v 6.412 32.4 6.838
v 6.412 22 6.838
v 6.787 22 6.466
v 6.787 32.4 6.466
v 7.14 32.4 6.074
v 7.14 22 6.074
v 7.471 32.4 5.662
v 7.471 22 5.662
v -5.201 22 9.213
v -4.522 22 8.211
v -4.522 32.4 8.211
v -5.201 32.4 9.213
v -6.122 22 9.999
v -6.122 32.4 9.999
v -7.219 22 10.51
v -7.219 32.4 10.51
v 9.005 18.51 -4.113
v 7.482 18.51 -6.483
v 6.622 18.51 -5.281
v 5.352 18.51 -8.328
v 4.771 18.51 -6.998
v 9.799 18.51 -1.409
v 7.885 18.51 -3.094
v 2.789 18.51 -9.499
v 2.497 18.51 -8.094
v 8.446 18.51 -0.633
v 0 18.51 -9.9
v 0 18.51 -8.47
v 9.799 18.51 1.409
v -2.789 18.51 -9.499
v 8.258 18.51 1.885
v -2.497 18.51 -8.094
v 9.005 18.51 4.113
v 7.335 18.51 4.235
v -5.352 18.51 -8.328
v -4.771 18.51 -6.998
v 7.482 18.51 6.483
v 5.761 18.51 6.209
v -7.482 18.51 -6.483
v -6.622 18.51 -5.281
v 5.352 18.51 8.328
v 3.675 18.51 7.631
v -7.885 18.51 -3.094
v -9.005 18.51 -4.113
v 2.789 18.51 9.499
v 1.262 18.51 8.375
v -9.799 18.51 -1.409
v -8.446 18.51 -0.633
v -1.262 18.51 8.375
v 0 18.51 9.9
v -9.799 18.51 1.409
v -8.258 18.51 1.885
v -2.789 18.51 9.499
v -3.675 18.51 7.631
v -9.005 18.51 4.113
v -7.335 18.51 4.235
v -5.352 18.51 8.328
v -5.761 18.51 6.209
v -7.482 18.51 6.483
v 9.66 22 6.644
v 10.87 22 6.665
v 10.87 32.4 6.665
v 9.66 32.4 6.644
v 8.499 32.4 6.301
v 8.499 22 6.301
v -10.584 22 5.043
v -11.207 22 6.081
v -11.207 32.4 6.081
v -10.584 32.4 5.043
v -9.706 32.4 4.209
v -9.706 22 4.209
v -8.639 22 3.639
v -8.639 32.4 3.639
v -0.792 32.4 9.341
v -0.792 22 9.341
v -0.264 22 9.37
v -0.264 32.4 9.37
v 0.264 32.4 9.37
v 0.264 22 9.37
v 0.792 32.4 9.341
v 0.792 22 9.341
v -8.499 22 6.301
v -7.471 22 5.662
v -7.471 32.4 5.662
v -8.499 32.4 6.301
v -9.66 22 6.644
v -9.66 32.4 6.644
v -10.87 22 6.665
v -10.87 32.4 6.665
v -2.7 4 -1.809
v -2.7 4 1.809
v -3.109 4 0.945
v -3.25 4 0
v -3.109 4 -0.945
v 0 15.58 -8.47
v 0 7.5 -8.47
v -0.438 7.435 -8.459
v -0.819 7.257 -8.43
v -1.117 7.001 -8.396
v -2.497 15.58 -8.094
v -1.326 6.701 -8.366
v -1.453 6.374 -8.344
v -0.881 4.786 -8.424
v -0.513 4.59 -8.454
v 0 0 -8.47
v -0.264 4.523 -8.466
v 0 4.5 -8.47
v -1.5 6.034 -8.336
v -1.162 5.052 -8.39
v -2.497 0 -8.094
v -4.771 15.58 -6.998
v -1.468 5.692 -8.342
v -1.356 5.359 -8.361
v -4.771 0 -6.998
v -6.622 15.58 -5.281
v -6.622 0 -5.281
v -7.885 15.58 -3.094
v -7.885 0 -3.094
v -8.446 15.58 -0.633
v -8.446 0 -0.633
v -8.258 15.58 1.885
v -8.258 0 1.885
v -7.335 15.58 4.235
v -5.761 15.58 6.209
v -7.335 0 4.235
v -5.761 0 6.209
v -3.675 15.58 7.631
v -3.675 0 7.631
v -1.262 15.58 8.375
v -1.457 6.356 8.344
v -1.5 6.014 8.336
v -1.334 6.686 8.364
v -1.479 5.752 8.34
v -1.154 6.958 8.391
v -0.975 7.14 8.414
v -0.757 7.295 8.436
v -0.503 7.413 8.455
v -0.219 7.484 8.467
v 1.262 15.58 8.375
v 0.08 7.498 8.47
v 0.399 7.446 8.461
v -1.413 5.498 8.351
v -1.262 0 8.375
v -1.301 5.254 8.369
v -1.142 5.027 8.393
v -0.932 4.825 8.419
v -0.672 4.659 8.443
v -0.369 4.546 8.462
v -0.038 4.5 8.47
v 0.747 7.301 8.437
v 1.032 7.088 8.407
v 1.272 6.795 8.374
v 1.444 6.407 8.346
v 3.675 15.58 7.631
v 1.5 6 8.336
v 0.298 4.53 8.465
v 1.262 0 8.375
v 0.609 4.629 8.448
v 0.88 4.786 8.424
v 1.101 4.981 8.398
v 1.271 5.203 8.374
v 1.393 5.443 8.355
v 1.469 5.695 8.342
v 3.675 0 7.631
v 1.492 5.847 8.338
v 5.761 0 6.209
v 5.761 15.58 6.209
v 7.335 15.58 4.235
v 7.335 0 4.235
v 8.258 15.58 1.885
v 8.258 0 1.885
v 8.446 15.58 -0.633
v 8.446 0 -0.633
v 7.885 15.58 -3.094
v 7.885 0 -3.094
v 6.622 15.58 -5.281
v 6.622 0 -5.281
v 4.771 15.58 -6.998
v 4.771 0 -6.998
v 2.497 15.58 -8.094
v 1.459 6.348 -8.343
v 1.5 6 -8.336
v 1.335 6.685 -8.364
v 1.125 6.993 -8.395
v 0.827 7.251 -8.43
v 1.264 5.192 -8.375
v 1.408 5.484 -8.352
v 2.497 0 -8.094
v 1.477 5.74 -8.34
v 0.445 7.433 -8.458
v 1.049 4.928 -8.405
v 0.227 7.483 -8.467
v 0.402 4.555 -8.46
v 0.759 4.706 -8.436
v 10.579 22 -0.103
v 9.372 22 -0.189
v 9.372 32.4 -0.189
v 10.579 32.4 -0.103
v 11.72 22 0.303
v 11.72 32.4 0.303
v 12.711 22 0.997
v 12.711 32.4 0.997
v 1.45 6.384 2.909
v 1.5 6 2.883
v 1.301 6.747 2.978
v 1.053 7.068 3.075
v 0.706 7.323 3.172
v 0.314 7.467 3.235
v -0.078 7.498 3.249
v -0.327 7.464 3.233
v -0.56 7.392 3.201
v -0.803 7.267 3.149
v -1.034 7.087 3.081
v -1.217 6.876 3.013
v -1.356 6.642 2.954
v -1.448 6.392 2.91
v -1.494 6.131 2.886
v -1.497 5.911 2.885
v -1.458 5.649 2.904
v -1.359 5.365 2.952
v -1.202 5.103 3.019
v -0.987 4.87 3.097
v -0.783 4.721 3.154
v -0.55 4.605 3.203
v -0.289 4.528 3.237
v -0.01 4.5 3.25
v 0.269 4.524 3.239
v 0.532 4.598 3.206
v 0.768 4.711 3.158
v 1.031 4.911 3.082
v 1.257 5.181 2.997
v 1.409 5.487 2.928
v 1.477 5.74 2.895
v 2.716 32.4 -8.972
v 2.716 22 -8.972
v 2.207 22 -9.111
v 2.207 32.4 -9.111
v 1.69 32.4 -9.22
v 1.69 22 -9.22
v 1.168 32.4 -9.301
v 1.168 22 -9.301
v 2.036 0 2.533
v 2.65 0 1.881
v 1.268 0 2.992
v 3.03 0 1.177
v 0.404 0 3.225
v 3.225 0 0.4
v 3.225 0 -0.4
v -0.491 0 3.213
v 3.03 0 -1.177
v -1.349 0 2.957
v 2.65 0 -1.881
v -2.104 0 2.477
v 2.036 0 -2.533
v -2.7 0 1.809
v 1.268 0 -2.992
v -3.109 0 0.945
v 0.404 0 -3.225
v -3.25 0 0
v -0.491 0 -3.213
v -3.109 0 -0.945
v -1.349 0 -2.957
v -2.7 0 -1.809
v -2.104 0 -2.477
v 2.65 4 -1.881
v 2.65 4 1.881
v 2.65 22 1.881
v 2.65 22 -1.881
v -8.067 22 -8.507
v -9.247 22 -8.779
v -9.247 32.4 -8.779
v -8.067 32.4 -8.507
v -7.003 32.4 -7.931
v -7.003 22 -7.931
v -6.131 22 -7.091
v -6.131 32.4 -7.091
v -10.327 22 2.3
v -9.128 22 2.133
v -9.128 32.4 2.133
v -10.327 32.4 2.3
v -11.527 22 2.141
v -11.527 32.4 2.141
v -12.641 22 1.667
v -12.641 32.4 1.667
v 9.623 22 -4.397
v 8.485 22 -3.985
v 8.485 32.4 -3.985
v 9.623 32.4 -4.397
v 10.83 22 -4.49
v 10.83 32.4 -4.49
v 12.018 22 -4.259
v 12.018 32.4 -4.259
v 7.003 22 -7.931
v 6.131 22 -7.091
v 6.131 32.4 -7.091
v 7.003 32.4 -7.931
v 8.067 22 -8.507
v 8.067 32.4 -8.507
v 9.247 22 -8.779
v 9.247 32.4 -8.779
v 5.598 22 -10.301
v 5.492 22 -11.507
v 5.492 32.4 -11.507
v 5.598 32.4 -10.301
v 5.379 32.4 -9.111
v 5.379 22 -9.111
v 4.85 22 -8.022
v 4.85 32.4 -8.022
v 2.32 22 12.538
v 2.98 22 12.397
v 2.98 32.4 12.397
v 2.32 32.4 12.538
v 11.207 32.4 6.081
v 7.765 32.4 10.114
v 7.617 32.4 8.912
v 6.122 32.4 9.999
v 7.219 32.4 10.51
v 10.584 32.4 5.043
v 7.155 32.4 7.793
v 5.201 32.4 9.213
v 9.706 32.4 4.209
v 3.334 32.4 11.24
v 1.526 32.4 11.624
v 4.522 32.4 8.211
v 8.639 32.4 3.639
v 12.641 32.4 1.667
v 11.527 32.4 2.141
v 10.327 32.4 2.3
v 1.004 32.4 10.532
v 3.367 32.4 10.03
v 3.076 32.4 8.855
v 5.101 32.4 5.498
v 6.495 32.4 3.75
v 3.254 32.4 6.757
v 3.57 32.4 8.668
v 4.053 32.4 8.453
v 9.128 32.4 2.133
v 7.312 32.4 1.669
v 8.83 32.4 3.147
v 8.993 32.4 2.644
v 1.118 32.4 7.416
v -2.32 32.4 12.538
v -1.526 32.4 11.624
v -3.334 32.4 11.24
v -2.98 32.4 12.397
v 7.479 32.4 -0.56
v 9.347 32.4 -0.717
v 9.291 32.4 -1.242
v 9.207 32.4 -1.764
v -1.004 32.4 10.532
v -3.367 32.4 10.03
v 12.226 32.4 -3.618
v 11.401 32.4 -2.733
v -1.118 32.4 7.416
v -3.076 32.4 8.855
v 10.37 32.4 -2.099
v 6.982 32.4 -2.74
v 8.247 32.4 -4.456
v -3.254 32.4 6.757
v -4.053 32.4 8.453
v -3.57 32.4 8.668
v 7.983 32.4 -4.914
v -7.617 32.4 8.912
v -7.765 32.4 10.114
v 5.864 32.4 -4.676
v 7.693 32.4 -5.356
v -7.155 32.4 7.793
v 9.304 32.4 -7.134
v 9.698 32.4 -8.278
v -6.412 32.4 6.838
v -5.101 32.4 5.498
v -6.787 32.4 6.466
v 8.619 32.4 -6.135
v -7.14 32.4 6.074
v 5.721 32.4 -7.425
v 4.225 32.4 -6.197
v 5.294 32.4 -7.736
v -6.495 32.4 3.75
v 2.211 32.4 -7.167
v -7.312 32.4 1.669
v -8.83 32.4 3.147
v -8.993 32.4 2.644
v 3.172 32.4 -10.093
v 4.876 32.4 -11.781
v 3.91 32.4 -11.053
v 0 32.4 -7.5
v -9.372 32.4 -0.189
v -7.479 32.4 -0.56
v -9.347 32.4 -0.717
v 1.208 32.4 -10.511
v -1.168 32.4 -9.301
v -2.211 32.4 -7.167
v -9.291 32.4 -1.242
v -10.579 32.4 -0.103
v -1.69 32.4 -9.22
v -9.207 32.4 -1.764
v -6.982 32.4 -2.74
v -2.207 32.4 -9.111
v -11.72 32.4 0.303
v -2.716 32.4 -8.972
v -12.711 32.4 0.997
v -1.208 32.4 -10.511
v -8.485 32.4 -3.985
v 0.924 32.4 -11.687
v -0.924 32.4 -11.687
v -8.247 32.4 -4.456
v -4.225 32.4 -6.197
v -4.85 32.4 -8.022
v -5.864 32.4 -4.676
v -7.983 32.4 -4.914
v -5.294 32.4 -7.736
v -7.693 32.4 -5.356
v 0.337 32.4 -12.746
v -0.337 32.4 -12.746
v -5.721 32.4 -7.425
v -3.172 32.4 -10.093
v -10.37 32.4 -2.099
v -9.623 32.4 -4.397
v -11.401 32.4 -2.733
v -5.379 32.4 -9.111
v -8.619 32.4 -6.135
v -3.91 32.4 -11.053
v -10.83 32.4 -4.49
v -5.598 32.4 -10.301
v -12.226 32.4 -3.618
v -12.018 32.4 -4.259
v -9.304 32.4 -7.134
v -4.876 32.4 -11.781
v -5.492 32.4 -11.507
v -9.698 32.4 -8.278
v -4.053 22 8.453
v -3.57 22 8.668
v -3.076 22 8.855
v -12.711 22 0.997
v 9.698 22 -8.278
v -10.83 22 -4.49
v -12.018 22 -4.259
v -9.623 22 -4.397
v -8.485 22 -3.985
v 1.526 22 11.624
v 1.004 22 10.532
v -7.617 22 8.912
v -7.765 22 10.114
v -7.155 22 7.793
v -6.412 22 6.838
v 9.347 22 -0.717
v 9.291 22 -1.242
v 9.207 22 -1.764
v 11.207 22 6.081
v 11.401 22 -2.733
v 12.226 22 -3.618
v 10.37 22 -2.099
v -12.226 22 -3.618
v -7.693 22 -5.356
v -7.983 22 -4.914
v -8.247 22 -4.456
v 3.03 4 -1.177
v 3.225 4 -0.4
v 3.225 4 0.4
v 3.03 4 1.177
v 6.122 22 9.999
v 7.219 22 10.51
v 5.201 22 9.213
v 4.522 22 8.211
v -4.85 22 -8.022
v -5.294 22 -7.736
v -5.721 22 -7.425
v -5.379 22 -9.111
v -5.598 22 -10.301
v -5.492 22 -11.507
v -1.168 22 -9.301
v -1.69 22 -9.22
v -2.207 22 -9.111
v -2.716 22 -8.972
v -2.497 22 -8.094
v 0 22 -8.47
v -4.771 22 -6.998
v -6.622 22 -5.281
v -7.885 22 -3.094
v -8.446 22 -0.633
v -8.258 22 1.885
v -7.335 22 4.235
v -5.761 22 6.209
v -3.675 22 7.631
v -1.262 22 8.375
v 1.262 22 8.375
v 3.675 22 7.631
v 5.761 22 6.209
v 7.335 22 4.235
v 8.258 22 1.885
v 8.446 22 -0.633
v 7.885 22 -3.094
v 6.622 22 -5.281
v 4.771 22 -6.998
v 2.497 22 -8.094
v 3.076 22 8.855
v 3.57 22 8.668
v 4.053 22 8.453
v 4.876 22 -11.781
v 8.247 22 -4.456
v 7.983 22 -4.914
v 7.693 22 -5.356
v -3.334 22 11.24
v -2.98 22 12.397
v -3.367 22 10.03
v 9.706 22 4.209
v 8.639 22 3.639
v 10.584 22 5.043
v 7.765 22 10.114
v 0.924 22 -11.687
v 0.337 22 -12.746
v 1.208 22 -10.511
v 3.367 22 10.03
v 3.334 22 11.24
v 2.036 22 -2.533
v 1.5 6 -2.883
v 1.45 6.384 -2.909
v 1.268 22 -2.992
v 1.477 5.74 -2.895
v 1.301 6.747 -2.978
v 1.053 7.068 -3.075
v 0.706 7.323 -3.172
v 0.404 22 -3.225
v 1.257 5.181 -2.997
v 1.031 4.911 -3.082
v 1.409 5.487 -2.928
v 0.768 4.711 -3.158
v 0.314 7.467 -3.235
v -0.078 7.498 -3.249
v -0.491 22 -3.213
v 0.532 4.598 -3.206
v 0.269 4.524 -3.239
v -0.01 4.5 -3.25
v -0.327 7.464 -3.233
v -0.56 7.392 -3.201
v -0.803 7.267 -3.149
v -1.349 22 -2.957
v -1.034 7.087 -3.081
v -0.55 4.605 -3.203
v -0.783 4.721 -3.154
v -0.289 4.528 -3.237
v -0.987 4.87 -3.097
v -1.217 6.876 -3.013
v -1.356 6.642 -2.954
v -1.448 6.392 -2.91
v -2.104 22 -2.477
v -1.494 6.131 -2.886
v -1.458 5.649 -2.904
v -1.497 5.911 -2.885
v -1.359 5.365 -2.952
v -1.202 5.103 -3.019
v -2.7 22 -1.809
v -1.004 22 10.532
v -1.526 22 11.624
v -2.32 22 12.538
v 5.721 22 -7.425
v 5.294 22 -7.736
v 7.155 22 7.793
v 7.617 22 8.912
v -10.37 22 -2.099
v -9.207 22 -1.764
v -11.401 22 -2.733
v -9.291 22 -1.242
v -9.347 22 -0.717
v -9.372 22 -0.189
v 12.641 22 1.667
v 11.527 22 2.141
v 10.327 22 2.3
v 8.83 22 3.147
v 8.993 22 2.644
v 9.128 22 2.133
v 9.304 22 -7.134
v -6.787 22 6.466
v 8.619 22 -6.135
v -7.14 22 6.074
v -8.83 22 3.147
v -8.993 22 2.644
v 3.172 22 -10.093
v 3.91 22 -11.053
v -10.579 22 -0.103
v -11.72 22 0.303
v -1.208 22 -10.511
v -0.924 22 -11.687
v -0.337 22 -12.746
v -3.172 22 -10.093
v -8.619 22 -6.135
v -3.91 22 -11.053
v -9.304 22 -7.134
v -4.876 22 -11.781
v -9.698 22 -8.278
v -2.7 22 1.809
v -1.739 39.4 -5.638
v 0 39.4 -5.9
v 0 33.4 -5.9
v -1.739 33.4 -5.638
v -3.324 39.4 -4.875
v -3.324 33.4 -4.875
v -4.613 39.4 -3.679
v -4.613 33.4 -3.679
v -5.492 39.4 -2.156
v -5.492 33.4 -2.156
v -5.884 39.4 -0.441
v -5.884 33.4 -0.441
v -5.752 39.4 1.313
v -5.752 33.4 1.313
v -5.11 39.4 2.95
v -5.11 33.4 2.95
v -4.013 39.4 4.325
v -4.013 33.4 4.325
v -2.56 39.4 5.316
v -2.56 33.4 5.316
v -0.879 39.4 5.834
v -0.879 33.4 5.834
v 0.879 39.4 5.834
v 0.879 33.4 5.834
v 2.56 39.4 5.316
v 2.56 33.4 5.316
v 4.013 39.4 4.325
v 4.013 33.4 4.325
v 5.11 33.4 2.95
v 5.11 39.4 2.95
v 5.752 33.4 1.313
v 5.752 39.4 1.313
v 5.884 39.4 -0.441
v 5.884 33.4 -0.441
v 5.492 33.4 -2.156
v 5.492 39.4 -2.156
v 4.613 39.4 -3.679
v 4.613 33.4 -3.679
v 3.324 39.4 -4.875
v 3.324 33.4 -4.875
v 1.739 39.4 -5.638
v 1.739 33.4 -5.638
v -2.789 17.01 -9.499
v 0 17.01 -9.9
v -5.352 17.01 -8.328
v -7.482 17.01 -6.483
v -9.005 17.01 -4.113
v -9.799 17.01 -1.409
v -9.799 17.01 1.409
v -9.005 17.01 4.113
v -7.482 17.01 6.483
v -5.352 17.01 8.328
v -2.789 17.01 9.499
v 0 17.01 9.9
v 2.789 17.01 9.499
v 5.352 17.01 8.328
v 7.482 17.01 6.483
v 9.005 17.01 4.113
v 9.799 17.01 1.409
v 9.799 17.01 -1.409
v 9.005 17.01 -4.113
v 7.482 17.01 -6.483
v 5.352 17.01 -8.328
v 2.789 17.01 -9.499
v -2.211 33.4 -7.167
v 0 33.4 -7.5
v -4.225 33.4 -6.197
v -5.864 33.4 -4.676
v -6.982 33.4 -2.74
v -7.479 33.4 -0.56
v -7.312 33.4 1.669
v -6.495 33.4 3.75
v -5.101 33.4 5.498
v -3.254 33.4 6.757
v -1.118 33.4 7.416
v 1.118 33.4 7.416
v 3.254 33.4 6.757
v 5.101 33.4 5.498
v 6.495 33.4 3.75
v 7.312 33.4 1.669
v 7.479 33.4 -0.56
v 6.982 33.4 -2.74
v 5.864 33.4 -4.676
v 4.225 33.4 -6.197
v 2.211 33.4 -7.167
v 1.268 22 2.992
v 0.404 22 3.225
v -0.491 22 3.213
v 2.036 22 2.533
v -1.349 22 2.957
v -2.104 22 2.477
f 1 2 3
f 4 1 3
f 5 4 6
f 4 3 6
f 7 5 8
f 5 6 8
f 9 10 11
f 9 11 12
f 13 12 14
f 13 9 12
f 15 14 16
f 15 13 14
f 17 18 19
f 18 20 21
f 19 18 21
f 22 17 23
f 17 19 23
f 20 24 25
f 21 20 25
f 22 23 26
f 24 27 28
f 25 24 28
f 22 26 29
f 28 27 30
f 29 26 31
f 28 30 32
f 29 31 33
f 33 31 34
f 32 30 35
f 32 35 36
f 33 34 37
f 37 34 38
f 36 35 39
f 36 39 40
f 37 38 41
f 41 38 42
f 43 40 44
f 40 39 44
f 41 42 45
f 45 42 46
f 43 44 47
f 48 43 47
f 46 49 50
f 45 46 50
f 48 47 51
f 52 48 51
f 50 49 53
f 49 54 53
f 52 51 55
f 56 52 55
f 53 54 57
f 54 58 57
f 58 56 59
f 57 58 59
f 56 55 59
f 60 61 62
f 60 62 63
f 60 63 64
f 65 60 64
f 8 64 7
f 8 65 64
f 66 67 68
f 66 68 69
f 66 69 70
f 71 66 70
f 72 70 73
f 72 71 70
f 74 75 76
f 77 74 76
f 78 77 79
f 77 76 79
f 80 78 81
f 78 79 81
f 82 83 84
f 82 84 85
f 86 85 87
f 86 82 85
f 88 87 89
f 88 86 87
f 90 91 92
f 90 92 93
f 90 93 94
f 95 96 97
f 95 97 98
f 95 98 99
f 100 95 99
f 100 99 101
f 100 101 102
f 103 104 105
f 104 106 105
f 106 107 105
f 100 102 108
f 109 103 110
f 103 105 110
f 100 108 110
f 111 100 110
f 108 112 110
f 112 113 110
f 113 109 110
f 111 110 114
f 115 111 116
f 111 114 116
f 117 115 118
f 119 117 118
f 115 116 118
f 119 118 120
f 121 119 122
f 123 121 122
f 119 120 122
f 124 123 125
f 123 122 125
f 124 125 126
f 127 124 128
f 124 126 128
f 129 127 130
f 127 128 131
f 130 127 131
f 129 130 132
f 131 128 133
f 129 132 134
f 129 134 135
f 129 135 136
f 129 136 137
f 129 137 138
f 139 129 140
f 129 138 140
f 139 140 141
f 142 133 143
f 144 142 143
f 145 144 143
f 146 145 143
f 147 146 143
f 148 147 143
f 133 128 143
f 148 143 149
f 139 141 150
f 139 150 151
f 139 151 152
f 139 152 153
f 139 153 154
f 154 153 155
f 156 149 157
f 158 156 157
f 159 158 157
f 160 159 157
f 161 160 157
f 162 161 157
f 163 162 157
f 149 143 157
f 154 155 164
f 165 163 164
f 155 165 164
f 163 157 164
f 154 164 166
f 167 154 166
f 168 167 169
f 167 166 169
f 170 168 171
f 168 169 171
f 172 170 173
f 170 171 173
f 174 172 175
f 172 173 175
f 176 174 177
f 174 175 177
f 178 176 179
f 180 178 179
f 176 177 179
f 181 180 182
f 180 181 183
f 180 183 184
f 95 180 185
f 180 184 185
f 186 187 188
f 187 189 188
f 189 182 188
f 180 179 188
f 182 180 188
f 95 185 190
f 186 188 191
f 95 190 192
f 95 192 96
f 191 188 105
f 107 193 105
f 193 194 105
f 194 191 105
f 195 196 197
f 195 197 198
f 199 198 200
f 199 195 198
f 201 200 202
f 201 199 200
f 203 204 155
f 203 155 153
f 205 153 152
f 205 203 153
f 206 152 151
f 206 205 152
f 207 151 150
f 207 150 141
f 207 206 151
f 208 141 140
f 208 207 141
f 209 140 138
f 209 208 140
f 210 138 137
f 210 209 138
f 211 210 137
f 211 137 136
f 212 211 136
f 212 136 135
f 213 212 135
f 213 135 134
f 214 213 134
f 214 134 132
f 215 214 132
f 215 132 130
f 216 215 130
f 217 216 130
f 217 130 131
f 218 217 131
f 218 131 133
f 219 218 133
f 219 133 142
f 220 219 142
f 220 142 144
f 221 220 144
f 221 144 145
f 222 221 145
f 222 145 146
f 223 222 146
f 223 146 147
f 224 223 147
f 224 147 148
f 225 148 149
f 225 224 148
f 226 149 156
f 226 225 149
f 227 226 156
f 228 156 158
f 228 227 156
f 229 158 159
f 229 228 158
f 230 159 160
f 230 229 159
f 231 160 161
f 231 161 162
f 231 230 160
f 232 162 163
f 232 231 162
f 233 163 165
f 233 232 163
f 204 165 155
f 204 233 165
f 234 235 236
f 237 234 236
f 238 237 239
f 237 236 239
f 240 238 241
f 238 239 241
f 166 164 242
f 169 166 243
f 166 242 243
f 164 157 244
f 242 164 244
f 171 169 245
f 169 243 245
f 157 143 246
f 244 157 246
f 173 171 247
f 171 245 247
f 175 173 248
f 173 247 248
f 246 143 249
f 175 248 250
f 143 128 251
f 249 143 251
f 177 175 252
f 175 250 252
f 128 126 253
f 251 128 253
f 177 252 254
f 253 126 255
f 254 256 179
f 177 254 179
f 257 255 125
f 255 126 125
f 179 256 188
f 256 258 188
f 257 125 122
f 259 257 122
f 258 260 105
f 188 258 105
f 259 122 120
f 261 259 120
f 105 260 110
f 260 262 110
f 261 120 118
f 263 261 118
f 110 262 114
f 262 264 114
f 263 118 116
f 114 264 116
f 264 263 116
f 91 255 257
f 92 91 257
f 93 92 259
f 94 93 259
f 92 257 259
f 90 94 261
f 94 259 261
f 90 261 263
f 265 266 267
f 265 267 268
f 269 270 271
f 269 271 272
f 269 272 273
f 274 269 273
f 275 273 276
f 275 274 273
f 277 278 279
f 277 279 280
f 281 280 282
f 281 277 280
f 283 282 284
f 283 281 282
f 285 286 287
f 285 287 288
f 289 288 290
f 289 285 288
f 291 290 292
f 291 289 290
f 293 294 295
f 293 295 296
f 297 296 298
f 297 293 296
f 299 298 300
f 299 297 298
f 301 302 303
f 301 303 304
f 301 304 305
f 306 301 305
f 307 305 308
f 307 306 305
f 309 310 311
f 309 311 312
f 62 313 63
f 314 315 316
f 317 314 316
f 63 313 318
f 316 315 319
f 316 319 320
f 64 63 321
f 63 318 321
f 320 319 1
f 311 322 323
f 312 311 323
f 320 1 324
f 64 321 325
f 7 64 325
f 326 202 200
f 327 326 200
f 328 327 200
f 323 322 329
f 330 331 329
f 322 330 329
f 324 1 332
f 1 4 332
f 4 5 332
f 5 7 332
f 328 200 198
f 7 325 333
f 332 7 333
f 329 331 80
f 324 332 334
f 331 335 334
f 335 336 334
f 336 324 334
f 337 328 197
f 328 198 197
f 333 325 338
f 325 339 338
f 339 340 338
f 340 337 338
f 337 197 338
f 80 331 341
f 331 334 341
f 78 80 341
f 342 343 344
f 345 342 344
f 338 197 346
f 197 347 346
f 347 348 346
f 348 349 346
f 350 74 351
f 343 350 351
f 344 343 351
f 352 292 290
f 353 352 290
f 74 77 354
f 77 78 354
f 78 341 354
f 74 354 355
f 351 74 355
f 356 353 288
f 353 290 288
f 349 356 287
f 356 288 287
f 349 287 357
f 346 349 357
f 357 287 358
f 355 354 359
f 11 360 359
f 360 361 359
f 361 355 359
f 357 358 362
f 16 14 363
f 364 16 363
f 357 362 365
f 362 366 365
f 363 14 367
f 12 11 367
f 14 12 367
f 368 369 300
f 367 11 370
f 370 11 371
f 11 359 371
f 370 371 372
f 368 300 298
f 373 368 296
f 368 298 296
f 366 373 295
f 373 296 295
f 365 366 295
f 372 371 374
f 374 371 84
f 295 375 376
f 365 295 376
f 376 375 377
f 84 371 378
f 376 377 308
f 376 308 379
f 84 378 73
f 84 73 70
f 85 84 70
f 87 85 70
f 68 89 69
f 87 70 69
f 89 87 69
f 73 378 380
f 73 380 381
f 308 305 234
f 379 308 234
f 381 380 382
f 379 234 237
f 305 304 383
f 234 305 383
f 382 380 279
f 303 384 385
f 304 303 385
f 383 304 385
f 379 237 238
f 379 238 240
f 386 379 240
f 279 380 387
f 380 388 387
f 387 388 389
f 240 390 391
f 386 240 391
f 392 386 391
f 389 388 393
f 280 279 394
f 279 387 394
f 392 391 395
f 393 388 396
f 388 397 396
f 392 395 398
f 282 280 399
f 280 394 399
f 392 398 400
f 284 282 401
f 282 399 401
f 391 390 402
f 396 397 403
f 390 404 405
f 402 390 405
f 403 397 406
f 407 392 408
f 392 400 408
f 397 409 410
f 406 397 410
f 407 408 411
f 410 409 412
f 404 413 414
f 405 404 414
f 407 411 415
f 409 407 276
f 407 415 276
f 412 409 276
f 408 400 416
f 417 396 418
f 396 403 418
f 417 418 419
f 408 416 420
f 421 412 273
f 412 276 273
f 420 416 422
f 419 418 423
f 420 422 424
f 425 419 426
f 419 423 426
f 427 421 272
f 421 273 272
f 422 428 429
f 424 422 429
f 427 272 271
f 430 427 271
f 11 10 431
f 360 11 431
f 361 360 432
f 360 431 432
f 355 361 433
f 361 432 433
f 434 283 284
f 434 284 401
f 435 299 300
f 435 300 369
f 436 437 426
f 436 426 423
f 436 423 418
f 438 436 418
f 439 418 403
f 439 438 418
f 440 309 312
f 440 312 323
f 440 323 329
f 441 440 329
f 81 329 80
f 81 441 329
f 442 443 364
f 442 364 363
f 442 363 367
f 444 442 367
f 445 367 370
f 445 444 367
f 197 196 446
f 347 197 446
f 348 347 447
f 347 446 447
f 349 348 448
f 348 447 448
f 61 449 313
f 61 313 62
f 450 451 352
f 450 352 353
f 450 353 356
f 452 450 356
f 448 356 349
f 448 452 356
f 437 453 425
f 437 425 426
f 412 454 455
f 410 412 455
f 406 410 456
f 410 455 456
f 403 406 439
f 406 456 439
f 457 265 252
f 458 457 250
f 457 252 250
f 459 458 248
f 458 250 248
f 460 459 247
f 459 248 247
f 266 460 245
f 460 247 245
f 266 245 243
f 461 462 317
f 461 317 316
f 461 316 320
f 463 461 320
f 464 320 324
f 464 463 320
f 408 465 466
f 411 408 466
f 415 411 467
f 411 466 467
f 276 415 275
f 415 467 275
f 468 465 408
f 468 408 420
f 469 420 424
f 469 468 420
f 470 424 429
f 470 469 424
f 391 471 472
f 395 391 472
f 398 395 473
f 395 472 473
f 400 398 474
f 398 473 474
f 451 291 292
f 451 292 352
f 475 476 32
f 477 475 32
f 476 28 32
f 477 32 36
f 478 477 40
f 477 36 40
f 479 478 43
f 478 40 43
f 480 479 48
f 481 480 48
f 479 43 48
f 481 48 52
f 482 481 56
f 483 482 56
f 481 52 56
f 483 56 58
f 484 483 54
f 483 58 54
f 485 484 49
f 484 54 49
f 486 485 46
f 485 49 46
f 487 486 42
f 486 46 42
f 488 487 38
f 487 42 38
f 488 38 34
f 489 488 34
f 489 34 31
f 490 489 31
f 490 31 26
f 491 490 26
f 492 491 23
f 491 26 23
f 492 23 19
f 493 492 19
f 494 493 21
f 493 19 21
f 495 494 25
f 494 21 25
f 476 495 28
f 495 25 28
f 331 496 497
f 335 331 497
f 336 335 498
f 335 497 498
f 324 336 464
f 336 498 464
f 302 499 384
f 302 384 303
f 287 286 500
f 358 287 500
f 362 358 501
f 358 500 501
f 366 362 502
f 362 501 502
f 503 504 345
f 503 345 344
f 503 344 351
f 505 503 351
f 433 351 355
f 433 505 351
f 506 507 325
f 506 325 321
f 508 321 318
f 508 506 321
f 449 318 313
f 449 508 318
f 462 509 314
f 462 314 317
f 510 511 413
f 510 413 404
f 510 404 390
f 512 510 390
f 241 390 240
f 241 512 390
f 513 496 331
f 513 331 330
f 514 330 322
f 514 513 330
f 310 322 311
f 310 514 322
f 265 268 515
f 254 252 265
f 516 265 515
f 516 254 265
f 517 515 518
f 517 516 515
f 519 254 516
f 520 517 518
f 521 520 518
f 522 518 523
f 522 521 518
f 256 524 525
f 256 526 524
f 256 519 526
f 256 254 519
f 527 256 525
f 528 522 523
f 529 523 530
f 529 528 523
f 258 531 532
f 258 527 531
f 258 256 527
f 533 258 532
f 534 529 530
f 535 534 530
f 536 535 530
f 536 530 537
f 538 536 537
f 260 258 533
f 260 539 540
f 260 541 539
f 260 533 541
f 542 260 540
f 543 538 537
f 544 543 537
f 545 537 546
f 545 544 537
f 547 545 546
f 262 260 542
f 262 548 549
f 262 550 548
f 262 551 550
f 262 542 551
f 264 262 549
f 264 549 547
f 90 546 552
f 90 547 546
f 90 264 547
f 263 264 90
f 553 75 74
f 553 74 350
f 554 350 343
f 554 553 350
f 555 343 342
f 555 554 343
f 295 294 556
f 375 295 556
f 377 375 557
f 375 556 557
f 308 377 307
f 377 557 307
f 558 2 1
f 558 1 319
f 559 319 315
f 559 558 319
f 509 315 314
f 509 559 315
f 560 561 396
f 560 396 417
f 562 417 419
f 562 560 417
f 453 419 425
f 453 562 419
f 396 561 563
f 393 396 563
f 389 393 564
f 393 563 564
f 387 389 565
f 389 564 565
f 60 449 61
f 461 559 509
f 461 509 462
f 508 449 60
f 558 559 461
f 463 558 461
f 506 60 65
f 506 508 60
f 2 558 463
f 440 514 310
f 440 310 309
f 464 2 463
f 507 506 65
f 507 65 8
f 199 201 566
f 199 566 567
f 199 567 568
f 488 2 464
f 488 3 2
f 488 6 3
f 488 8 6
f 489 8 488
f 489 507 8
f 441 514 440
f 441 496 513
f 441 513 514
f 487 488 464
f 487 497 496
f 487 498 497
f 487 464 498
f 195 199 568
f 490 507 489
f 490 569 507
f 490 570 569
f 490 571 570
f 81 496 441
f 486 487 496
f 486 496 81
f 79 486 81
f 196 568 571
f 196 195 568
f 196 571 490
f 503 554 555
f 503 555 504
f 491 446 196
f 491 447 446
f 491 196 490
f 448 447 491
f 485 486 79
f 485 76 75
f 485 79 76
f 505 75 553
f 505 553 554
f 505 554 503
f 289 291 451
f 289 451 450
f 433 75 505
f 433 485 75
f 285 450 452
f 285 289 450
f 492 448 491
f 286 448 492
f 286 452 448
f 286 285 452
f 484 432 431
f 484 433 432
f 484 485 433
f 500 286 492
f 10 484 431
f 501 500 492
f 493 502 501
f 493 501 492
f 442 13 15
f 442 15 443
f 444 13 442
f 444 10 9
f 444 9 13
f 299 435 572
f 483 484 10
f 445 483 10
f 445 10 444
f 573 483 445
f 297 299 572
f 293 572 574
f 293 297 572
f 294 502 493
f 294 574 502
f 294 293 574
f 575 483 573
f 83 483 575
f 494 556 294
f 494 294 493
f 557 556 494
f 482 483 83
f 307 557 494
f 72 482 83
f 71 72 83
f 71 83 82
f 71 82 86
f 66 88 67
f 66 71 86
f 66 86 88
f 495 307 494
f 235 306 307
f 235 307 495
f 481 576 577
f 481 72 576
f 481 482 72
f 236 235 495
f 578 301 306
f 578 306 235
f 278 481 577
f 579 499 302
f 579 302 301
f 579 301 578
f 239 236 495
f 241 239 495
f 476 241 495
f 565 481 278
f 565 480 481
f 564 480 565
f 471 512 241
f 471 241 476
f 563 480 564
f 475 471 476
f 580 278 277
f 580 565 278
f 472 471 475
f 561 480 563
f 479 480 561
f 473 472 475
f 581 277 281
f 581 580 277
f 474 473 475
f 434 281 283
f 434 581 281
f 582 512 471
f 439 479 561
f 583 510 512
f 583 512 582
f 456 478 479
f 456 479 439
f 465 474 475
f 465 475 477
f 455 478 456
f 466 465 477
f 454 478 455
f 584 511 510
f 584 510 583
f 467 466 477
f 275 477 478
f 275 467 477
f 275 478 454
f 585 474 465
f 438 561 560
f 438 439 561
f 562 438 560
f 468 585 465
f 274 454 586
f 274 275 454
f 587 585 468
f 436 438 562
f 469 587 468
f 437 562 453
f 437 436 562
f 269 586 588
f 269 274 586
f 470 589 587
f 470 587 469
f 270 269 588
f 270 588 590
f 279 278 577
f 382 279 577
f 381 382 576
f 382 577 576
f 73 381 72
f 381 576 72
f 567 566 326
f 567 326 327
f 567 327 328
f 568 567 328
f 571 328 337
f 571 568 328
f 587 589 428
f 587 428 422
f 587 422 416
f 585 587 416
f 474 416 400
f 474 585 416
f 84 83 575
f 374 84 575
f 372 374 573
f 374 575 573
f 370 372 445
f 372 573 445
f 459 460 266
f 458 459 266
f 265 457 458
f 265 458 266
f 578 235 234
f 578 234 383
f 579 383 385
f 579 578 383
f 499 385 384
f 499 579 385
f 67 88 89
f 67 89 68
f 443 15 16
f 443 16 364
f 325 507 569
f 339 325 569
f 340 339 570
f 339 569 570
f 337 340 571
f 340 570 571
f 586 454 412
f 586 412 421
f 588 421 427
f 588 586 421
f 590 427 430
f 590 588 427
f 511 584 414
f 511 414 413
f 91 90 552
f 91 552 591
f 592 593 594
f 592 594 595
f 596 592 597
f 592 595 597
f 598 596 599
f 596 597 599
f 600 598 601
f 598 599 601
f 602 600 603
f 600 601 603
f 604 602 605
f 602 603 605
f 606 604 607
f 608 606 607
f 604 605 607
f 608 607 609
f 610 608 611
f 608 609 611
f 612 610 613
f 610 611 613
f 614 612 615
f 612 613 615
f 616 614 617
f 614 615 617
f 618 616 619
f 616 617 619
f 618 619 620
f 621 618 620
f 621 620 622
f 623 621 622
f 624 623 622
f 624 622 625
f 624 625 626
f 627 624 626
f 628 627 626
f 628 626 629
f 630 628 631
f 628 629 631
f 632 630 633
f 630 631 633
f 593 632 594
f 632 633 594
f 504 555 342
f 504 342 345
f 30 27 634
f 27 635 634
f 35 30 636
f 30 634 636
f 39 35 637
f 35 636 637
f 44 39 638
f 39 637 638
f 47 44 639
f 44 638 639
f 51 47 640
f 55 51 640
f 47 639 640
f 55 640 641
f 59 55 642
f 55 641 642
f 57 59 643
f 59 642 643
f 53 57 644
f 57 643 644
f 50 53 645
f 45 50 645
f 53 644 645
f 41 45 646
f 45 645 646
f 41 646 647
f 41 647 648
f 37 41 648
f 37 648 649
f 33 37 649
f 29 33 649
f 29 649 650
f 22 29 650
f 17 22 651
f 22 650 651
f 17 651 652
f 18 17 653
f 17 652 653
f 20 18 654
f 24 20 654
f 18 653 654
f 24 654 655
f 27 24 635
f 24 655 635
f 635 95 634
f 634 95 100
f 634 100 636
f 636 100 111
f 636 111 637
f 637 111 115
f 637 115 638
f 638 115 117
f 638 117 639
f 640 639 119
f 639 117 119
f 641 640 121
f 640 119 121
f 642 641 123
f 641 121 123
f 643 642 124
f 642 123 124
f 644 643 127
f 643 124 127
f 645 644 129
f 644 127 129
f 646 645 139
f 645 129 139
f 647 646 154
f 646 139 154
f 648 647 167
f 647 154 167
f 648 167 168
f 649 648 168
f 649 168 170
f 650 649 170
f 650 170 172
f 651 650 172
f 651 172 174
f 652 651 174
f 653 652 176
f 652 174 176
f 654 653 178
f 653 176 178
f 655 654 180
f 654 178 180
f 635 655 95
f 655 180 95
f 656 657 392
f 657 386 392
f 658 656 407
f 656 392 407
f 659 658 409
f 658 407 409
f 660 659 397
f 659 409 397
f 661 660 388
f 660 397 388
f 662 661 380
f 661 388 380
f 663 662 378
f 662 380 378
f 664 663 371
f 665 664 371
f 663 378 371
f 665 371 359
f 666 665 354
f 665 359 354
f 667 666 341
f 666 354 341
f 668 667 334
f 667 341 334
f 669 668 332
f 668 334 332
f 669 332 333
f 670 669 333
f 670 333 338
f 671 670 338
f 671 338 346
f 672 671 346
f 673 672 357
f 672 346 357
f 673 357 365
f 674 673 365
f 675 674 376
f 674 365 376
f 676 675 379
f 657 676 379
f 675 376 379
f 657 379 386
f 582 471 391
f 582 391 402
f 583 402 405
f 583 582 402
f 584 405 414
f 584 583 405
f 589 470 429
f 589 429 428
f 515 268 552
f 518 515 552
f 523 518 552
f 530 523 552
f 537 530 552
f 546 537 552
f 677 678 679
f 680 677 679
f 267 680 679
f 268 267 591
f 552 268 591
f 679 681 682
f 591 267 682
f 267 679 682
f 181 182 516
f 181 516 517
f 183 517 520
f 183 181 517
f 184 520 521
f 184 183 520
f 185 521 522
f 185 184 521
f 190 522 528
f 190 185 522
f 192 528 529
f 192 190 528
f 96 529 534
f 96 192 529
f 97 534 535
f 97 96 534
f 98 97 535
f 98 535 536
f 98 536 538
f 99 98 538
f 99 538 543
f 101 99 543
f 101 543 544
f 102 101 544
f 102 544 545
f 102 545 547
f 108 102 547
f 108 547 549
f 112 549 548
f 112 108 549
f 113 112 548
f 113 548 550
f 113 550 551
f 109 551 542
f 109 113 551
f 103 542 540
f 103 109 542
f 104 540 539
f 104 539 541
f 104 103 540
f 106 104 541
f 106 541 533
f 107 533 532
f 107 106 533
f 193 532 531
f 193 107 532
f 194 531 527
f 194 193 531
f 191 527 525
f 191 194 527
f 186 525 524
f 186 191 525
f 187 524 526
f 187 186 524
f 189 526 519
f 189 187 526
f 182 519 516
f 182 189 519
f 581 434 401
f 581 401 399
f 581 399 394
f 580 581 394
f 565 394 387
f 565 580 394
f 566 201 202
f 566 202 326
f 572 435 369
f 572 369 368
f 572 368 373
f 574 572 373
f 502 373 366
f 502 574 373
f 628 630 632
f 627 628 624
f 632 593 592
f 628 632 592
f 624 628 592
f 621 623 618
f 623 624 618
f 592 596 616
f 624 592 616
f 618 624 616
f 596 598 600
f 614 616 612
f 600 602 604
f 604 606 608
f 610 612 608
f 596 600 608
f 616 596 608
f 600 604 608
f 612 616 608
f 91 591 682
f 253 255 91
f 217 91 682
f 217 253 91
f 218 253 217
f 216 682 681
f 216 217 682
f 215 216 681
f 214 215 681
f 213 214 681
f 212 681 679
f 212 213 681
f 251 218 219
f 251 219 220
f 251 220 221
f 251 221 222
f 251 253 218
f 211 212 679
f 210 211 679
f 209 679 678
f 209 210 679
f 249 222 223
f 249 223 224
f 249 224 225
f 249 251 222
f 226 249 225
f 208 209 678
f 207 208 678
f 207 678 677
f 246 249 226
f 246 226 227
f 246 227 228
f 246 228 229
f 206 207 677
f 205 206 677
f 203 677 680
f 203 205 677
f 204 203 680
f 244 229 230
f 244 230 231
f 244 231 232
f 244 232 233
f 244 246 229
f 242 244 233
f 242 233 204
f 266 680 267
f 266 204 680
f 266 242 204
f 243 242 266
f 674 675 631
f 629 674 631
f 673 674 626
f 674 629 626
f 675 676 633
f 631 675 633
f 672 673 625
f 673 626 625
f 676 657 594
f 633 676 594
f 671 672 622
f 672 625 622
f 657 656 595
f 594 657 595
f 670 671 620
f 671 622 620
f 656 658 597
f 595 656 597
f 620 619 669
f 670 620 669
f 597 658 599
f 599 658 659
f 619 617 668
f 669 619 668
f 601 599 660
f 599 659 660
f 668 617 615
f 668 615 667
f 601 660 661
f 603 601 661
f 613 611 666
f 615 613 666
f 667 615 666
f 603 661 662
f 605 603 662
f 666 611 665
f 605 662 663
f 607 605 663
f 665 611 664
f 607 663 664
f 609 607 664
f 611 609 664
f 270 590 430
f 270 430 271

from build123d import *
from build123d.topology import SkipClean

# Parameters (mm, degrees)
RESSALTO_EXTRUS_O1_START   = -10.4
RESSALTO_EXTRUS_O1_DEPTH   = 10.4
PADR_OCIRCULAR1_COUNT      = 15
CORTE_EXTRUS_O1_DEPTH      = 22
ESBO_O4_R                  = 3.25
CORTE_EXTRUS_O2_DEPTH      = 4
CORTE_EXTRUS_O4_DEPTH      = 44.317435995
CORTE_EXTRUS_O4_DEPTH_BACK = 44.317435995
ESBO_O7_R                  = 1.5


with BuildPart() as part:
    # Esboço1 → Revolução1 (revolve)
    with BuildSketch(Plane.XY, mode=Mode.PRIVATE) as revolu_o1_sk:
        Polygon((0, 0), (0, 39.4), (5.9, 39.4), (5.9, 33.4), (7.5, 33.4), (7.5, 32.4), (9.374, 32.4), (9.374, 22), (8.47, 22), (8.47, 18.51), (9.9, 18.51), (9.9, 17.01), (8.47, 15.58), (8.47, 0), align=None)
    revolve(revolu_o1_sk.sketch.rotate(Axis((0, 0, 0), (0, 1, 0)), 90), axis=Axis((0, 0, 0), (0, 1, 0)))

    # Esboço2 → Ressalto-extrusão1 (add)
    with BuildSketch(Plane(origin=(0, 32.4, 0), x_dir=(1, 0, 0), z_dir=(0, 1, 0)).offset(RESSALTO_EXTRUS_O1_START)):
        with BuildLine():
            Line((-0.337, 12.746), (0.337, 12.746))
            ThreePointArc((0.337, 12.746), (1.105703178, 11.108702403), (1.167644885, 9.300993572))
            ThreePointArc((1.167644885, 9.300993572), (0, 9.374), (-1.167644885, 9.300993572))
            ThreePointArc((-1.167644885, 9.300993572), (-1.105703178, 11.108702403), (-0.337, 12.746))
        make_face()
    ressalto_extrus_o1 = extrude(amount=RESSALTO_EXTRUS_O1_DEPTH)

    # PadrãoCircular1: Ressalto-extrusão1 ×15 about axis
    padr_ocircular1_axis = Axis((0, 0, 0), (0, 1, 0))
    for i in range(1, PADR_OCIRCULAR1_COUNT):
        add(ressalto_extrus_o1.rotate(padr_ocircular1_axis, i * 360 / PADR_OCIRCULAR1_COUNT))

    # Esboço3 → Corte-extrusão1 (cut)
    with BuildSketch(Plane.XZ):
        with BuildLine():
            Line((2.65, 1.881488772), (2.65, -1.881488772))
            ThreePointArc((2.65, -1.881488772), (-0.044028005, -3.249701761), (-2.7, -1.809005252))
            Line((-2.7, -1.809005252), (-2.7, 1.809005252))
            ThreePointArc((-2.7, 1.809005252), (-0.044028005, 3.249701761), (2.65, 1.881488772))
        make_face()
    extrude(amount=-CORTE_EXTRUS_O1_DEPTH, mode=Mode.SUBTRACT)

    # Esboço4 → Corte-extrusão2 (cut)
    with SkipClean():  # the faces are left unmerged after this step: merging them gives an invalid solid
        with BuildSketch(Plane.XZ):
            with Locations(Location((0, 0, 0), (0, 0, 270))):
                Circle(ESBO_O4_R)
        extrude(amount=-CORTE_EXTRUS_O2_DEPTH, mode=Mode.SUBTRACT)

    # Esboço7 → Corte-extrusão4 (cut, two sides: drawn at the far end of the back side and taken through both)
    with BuildSketch(Plane.XY.offset(-CORTE_EXTRUS_O4_DEPTH_BACK)):
        with Locations((0, 6)):
            Circle(ESBO_O7_R)
    extrude(amount=CORTE_EXTRUS_O4_DEPTH + CORTE_EXTRUS_O4_DEPTH_BACK, mode=Mode.SUBTRACT)


solid = part.part
